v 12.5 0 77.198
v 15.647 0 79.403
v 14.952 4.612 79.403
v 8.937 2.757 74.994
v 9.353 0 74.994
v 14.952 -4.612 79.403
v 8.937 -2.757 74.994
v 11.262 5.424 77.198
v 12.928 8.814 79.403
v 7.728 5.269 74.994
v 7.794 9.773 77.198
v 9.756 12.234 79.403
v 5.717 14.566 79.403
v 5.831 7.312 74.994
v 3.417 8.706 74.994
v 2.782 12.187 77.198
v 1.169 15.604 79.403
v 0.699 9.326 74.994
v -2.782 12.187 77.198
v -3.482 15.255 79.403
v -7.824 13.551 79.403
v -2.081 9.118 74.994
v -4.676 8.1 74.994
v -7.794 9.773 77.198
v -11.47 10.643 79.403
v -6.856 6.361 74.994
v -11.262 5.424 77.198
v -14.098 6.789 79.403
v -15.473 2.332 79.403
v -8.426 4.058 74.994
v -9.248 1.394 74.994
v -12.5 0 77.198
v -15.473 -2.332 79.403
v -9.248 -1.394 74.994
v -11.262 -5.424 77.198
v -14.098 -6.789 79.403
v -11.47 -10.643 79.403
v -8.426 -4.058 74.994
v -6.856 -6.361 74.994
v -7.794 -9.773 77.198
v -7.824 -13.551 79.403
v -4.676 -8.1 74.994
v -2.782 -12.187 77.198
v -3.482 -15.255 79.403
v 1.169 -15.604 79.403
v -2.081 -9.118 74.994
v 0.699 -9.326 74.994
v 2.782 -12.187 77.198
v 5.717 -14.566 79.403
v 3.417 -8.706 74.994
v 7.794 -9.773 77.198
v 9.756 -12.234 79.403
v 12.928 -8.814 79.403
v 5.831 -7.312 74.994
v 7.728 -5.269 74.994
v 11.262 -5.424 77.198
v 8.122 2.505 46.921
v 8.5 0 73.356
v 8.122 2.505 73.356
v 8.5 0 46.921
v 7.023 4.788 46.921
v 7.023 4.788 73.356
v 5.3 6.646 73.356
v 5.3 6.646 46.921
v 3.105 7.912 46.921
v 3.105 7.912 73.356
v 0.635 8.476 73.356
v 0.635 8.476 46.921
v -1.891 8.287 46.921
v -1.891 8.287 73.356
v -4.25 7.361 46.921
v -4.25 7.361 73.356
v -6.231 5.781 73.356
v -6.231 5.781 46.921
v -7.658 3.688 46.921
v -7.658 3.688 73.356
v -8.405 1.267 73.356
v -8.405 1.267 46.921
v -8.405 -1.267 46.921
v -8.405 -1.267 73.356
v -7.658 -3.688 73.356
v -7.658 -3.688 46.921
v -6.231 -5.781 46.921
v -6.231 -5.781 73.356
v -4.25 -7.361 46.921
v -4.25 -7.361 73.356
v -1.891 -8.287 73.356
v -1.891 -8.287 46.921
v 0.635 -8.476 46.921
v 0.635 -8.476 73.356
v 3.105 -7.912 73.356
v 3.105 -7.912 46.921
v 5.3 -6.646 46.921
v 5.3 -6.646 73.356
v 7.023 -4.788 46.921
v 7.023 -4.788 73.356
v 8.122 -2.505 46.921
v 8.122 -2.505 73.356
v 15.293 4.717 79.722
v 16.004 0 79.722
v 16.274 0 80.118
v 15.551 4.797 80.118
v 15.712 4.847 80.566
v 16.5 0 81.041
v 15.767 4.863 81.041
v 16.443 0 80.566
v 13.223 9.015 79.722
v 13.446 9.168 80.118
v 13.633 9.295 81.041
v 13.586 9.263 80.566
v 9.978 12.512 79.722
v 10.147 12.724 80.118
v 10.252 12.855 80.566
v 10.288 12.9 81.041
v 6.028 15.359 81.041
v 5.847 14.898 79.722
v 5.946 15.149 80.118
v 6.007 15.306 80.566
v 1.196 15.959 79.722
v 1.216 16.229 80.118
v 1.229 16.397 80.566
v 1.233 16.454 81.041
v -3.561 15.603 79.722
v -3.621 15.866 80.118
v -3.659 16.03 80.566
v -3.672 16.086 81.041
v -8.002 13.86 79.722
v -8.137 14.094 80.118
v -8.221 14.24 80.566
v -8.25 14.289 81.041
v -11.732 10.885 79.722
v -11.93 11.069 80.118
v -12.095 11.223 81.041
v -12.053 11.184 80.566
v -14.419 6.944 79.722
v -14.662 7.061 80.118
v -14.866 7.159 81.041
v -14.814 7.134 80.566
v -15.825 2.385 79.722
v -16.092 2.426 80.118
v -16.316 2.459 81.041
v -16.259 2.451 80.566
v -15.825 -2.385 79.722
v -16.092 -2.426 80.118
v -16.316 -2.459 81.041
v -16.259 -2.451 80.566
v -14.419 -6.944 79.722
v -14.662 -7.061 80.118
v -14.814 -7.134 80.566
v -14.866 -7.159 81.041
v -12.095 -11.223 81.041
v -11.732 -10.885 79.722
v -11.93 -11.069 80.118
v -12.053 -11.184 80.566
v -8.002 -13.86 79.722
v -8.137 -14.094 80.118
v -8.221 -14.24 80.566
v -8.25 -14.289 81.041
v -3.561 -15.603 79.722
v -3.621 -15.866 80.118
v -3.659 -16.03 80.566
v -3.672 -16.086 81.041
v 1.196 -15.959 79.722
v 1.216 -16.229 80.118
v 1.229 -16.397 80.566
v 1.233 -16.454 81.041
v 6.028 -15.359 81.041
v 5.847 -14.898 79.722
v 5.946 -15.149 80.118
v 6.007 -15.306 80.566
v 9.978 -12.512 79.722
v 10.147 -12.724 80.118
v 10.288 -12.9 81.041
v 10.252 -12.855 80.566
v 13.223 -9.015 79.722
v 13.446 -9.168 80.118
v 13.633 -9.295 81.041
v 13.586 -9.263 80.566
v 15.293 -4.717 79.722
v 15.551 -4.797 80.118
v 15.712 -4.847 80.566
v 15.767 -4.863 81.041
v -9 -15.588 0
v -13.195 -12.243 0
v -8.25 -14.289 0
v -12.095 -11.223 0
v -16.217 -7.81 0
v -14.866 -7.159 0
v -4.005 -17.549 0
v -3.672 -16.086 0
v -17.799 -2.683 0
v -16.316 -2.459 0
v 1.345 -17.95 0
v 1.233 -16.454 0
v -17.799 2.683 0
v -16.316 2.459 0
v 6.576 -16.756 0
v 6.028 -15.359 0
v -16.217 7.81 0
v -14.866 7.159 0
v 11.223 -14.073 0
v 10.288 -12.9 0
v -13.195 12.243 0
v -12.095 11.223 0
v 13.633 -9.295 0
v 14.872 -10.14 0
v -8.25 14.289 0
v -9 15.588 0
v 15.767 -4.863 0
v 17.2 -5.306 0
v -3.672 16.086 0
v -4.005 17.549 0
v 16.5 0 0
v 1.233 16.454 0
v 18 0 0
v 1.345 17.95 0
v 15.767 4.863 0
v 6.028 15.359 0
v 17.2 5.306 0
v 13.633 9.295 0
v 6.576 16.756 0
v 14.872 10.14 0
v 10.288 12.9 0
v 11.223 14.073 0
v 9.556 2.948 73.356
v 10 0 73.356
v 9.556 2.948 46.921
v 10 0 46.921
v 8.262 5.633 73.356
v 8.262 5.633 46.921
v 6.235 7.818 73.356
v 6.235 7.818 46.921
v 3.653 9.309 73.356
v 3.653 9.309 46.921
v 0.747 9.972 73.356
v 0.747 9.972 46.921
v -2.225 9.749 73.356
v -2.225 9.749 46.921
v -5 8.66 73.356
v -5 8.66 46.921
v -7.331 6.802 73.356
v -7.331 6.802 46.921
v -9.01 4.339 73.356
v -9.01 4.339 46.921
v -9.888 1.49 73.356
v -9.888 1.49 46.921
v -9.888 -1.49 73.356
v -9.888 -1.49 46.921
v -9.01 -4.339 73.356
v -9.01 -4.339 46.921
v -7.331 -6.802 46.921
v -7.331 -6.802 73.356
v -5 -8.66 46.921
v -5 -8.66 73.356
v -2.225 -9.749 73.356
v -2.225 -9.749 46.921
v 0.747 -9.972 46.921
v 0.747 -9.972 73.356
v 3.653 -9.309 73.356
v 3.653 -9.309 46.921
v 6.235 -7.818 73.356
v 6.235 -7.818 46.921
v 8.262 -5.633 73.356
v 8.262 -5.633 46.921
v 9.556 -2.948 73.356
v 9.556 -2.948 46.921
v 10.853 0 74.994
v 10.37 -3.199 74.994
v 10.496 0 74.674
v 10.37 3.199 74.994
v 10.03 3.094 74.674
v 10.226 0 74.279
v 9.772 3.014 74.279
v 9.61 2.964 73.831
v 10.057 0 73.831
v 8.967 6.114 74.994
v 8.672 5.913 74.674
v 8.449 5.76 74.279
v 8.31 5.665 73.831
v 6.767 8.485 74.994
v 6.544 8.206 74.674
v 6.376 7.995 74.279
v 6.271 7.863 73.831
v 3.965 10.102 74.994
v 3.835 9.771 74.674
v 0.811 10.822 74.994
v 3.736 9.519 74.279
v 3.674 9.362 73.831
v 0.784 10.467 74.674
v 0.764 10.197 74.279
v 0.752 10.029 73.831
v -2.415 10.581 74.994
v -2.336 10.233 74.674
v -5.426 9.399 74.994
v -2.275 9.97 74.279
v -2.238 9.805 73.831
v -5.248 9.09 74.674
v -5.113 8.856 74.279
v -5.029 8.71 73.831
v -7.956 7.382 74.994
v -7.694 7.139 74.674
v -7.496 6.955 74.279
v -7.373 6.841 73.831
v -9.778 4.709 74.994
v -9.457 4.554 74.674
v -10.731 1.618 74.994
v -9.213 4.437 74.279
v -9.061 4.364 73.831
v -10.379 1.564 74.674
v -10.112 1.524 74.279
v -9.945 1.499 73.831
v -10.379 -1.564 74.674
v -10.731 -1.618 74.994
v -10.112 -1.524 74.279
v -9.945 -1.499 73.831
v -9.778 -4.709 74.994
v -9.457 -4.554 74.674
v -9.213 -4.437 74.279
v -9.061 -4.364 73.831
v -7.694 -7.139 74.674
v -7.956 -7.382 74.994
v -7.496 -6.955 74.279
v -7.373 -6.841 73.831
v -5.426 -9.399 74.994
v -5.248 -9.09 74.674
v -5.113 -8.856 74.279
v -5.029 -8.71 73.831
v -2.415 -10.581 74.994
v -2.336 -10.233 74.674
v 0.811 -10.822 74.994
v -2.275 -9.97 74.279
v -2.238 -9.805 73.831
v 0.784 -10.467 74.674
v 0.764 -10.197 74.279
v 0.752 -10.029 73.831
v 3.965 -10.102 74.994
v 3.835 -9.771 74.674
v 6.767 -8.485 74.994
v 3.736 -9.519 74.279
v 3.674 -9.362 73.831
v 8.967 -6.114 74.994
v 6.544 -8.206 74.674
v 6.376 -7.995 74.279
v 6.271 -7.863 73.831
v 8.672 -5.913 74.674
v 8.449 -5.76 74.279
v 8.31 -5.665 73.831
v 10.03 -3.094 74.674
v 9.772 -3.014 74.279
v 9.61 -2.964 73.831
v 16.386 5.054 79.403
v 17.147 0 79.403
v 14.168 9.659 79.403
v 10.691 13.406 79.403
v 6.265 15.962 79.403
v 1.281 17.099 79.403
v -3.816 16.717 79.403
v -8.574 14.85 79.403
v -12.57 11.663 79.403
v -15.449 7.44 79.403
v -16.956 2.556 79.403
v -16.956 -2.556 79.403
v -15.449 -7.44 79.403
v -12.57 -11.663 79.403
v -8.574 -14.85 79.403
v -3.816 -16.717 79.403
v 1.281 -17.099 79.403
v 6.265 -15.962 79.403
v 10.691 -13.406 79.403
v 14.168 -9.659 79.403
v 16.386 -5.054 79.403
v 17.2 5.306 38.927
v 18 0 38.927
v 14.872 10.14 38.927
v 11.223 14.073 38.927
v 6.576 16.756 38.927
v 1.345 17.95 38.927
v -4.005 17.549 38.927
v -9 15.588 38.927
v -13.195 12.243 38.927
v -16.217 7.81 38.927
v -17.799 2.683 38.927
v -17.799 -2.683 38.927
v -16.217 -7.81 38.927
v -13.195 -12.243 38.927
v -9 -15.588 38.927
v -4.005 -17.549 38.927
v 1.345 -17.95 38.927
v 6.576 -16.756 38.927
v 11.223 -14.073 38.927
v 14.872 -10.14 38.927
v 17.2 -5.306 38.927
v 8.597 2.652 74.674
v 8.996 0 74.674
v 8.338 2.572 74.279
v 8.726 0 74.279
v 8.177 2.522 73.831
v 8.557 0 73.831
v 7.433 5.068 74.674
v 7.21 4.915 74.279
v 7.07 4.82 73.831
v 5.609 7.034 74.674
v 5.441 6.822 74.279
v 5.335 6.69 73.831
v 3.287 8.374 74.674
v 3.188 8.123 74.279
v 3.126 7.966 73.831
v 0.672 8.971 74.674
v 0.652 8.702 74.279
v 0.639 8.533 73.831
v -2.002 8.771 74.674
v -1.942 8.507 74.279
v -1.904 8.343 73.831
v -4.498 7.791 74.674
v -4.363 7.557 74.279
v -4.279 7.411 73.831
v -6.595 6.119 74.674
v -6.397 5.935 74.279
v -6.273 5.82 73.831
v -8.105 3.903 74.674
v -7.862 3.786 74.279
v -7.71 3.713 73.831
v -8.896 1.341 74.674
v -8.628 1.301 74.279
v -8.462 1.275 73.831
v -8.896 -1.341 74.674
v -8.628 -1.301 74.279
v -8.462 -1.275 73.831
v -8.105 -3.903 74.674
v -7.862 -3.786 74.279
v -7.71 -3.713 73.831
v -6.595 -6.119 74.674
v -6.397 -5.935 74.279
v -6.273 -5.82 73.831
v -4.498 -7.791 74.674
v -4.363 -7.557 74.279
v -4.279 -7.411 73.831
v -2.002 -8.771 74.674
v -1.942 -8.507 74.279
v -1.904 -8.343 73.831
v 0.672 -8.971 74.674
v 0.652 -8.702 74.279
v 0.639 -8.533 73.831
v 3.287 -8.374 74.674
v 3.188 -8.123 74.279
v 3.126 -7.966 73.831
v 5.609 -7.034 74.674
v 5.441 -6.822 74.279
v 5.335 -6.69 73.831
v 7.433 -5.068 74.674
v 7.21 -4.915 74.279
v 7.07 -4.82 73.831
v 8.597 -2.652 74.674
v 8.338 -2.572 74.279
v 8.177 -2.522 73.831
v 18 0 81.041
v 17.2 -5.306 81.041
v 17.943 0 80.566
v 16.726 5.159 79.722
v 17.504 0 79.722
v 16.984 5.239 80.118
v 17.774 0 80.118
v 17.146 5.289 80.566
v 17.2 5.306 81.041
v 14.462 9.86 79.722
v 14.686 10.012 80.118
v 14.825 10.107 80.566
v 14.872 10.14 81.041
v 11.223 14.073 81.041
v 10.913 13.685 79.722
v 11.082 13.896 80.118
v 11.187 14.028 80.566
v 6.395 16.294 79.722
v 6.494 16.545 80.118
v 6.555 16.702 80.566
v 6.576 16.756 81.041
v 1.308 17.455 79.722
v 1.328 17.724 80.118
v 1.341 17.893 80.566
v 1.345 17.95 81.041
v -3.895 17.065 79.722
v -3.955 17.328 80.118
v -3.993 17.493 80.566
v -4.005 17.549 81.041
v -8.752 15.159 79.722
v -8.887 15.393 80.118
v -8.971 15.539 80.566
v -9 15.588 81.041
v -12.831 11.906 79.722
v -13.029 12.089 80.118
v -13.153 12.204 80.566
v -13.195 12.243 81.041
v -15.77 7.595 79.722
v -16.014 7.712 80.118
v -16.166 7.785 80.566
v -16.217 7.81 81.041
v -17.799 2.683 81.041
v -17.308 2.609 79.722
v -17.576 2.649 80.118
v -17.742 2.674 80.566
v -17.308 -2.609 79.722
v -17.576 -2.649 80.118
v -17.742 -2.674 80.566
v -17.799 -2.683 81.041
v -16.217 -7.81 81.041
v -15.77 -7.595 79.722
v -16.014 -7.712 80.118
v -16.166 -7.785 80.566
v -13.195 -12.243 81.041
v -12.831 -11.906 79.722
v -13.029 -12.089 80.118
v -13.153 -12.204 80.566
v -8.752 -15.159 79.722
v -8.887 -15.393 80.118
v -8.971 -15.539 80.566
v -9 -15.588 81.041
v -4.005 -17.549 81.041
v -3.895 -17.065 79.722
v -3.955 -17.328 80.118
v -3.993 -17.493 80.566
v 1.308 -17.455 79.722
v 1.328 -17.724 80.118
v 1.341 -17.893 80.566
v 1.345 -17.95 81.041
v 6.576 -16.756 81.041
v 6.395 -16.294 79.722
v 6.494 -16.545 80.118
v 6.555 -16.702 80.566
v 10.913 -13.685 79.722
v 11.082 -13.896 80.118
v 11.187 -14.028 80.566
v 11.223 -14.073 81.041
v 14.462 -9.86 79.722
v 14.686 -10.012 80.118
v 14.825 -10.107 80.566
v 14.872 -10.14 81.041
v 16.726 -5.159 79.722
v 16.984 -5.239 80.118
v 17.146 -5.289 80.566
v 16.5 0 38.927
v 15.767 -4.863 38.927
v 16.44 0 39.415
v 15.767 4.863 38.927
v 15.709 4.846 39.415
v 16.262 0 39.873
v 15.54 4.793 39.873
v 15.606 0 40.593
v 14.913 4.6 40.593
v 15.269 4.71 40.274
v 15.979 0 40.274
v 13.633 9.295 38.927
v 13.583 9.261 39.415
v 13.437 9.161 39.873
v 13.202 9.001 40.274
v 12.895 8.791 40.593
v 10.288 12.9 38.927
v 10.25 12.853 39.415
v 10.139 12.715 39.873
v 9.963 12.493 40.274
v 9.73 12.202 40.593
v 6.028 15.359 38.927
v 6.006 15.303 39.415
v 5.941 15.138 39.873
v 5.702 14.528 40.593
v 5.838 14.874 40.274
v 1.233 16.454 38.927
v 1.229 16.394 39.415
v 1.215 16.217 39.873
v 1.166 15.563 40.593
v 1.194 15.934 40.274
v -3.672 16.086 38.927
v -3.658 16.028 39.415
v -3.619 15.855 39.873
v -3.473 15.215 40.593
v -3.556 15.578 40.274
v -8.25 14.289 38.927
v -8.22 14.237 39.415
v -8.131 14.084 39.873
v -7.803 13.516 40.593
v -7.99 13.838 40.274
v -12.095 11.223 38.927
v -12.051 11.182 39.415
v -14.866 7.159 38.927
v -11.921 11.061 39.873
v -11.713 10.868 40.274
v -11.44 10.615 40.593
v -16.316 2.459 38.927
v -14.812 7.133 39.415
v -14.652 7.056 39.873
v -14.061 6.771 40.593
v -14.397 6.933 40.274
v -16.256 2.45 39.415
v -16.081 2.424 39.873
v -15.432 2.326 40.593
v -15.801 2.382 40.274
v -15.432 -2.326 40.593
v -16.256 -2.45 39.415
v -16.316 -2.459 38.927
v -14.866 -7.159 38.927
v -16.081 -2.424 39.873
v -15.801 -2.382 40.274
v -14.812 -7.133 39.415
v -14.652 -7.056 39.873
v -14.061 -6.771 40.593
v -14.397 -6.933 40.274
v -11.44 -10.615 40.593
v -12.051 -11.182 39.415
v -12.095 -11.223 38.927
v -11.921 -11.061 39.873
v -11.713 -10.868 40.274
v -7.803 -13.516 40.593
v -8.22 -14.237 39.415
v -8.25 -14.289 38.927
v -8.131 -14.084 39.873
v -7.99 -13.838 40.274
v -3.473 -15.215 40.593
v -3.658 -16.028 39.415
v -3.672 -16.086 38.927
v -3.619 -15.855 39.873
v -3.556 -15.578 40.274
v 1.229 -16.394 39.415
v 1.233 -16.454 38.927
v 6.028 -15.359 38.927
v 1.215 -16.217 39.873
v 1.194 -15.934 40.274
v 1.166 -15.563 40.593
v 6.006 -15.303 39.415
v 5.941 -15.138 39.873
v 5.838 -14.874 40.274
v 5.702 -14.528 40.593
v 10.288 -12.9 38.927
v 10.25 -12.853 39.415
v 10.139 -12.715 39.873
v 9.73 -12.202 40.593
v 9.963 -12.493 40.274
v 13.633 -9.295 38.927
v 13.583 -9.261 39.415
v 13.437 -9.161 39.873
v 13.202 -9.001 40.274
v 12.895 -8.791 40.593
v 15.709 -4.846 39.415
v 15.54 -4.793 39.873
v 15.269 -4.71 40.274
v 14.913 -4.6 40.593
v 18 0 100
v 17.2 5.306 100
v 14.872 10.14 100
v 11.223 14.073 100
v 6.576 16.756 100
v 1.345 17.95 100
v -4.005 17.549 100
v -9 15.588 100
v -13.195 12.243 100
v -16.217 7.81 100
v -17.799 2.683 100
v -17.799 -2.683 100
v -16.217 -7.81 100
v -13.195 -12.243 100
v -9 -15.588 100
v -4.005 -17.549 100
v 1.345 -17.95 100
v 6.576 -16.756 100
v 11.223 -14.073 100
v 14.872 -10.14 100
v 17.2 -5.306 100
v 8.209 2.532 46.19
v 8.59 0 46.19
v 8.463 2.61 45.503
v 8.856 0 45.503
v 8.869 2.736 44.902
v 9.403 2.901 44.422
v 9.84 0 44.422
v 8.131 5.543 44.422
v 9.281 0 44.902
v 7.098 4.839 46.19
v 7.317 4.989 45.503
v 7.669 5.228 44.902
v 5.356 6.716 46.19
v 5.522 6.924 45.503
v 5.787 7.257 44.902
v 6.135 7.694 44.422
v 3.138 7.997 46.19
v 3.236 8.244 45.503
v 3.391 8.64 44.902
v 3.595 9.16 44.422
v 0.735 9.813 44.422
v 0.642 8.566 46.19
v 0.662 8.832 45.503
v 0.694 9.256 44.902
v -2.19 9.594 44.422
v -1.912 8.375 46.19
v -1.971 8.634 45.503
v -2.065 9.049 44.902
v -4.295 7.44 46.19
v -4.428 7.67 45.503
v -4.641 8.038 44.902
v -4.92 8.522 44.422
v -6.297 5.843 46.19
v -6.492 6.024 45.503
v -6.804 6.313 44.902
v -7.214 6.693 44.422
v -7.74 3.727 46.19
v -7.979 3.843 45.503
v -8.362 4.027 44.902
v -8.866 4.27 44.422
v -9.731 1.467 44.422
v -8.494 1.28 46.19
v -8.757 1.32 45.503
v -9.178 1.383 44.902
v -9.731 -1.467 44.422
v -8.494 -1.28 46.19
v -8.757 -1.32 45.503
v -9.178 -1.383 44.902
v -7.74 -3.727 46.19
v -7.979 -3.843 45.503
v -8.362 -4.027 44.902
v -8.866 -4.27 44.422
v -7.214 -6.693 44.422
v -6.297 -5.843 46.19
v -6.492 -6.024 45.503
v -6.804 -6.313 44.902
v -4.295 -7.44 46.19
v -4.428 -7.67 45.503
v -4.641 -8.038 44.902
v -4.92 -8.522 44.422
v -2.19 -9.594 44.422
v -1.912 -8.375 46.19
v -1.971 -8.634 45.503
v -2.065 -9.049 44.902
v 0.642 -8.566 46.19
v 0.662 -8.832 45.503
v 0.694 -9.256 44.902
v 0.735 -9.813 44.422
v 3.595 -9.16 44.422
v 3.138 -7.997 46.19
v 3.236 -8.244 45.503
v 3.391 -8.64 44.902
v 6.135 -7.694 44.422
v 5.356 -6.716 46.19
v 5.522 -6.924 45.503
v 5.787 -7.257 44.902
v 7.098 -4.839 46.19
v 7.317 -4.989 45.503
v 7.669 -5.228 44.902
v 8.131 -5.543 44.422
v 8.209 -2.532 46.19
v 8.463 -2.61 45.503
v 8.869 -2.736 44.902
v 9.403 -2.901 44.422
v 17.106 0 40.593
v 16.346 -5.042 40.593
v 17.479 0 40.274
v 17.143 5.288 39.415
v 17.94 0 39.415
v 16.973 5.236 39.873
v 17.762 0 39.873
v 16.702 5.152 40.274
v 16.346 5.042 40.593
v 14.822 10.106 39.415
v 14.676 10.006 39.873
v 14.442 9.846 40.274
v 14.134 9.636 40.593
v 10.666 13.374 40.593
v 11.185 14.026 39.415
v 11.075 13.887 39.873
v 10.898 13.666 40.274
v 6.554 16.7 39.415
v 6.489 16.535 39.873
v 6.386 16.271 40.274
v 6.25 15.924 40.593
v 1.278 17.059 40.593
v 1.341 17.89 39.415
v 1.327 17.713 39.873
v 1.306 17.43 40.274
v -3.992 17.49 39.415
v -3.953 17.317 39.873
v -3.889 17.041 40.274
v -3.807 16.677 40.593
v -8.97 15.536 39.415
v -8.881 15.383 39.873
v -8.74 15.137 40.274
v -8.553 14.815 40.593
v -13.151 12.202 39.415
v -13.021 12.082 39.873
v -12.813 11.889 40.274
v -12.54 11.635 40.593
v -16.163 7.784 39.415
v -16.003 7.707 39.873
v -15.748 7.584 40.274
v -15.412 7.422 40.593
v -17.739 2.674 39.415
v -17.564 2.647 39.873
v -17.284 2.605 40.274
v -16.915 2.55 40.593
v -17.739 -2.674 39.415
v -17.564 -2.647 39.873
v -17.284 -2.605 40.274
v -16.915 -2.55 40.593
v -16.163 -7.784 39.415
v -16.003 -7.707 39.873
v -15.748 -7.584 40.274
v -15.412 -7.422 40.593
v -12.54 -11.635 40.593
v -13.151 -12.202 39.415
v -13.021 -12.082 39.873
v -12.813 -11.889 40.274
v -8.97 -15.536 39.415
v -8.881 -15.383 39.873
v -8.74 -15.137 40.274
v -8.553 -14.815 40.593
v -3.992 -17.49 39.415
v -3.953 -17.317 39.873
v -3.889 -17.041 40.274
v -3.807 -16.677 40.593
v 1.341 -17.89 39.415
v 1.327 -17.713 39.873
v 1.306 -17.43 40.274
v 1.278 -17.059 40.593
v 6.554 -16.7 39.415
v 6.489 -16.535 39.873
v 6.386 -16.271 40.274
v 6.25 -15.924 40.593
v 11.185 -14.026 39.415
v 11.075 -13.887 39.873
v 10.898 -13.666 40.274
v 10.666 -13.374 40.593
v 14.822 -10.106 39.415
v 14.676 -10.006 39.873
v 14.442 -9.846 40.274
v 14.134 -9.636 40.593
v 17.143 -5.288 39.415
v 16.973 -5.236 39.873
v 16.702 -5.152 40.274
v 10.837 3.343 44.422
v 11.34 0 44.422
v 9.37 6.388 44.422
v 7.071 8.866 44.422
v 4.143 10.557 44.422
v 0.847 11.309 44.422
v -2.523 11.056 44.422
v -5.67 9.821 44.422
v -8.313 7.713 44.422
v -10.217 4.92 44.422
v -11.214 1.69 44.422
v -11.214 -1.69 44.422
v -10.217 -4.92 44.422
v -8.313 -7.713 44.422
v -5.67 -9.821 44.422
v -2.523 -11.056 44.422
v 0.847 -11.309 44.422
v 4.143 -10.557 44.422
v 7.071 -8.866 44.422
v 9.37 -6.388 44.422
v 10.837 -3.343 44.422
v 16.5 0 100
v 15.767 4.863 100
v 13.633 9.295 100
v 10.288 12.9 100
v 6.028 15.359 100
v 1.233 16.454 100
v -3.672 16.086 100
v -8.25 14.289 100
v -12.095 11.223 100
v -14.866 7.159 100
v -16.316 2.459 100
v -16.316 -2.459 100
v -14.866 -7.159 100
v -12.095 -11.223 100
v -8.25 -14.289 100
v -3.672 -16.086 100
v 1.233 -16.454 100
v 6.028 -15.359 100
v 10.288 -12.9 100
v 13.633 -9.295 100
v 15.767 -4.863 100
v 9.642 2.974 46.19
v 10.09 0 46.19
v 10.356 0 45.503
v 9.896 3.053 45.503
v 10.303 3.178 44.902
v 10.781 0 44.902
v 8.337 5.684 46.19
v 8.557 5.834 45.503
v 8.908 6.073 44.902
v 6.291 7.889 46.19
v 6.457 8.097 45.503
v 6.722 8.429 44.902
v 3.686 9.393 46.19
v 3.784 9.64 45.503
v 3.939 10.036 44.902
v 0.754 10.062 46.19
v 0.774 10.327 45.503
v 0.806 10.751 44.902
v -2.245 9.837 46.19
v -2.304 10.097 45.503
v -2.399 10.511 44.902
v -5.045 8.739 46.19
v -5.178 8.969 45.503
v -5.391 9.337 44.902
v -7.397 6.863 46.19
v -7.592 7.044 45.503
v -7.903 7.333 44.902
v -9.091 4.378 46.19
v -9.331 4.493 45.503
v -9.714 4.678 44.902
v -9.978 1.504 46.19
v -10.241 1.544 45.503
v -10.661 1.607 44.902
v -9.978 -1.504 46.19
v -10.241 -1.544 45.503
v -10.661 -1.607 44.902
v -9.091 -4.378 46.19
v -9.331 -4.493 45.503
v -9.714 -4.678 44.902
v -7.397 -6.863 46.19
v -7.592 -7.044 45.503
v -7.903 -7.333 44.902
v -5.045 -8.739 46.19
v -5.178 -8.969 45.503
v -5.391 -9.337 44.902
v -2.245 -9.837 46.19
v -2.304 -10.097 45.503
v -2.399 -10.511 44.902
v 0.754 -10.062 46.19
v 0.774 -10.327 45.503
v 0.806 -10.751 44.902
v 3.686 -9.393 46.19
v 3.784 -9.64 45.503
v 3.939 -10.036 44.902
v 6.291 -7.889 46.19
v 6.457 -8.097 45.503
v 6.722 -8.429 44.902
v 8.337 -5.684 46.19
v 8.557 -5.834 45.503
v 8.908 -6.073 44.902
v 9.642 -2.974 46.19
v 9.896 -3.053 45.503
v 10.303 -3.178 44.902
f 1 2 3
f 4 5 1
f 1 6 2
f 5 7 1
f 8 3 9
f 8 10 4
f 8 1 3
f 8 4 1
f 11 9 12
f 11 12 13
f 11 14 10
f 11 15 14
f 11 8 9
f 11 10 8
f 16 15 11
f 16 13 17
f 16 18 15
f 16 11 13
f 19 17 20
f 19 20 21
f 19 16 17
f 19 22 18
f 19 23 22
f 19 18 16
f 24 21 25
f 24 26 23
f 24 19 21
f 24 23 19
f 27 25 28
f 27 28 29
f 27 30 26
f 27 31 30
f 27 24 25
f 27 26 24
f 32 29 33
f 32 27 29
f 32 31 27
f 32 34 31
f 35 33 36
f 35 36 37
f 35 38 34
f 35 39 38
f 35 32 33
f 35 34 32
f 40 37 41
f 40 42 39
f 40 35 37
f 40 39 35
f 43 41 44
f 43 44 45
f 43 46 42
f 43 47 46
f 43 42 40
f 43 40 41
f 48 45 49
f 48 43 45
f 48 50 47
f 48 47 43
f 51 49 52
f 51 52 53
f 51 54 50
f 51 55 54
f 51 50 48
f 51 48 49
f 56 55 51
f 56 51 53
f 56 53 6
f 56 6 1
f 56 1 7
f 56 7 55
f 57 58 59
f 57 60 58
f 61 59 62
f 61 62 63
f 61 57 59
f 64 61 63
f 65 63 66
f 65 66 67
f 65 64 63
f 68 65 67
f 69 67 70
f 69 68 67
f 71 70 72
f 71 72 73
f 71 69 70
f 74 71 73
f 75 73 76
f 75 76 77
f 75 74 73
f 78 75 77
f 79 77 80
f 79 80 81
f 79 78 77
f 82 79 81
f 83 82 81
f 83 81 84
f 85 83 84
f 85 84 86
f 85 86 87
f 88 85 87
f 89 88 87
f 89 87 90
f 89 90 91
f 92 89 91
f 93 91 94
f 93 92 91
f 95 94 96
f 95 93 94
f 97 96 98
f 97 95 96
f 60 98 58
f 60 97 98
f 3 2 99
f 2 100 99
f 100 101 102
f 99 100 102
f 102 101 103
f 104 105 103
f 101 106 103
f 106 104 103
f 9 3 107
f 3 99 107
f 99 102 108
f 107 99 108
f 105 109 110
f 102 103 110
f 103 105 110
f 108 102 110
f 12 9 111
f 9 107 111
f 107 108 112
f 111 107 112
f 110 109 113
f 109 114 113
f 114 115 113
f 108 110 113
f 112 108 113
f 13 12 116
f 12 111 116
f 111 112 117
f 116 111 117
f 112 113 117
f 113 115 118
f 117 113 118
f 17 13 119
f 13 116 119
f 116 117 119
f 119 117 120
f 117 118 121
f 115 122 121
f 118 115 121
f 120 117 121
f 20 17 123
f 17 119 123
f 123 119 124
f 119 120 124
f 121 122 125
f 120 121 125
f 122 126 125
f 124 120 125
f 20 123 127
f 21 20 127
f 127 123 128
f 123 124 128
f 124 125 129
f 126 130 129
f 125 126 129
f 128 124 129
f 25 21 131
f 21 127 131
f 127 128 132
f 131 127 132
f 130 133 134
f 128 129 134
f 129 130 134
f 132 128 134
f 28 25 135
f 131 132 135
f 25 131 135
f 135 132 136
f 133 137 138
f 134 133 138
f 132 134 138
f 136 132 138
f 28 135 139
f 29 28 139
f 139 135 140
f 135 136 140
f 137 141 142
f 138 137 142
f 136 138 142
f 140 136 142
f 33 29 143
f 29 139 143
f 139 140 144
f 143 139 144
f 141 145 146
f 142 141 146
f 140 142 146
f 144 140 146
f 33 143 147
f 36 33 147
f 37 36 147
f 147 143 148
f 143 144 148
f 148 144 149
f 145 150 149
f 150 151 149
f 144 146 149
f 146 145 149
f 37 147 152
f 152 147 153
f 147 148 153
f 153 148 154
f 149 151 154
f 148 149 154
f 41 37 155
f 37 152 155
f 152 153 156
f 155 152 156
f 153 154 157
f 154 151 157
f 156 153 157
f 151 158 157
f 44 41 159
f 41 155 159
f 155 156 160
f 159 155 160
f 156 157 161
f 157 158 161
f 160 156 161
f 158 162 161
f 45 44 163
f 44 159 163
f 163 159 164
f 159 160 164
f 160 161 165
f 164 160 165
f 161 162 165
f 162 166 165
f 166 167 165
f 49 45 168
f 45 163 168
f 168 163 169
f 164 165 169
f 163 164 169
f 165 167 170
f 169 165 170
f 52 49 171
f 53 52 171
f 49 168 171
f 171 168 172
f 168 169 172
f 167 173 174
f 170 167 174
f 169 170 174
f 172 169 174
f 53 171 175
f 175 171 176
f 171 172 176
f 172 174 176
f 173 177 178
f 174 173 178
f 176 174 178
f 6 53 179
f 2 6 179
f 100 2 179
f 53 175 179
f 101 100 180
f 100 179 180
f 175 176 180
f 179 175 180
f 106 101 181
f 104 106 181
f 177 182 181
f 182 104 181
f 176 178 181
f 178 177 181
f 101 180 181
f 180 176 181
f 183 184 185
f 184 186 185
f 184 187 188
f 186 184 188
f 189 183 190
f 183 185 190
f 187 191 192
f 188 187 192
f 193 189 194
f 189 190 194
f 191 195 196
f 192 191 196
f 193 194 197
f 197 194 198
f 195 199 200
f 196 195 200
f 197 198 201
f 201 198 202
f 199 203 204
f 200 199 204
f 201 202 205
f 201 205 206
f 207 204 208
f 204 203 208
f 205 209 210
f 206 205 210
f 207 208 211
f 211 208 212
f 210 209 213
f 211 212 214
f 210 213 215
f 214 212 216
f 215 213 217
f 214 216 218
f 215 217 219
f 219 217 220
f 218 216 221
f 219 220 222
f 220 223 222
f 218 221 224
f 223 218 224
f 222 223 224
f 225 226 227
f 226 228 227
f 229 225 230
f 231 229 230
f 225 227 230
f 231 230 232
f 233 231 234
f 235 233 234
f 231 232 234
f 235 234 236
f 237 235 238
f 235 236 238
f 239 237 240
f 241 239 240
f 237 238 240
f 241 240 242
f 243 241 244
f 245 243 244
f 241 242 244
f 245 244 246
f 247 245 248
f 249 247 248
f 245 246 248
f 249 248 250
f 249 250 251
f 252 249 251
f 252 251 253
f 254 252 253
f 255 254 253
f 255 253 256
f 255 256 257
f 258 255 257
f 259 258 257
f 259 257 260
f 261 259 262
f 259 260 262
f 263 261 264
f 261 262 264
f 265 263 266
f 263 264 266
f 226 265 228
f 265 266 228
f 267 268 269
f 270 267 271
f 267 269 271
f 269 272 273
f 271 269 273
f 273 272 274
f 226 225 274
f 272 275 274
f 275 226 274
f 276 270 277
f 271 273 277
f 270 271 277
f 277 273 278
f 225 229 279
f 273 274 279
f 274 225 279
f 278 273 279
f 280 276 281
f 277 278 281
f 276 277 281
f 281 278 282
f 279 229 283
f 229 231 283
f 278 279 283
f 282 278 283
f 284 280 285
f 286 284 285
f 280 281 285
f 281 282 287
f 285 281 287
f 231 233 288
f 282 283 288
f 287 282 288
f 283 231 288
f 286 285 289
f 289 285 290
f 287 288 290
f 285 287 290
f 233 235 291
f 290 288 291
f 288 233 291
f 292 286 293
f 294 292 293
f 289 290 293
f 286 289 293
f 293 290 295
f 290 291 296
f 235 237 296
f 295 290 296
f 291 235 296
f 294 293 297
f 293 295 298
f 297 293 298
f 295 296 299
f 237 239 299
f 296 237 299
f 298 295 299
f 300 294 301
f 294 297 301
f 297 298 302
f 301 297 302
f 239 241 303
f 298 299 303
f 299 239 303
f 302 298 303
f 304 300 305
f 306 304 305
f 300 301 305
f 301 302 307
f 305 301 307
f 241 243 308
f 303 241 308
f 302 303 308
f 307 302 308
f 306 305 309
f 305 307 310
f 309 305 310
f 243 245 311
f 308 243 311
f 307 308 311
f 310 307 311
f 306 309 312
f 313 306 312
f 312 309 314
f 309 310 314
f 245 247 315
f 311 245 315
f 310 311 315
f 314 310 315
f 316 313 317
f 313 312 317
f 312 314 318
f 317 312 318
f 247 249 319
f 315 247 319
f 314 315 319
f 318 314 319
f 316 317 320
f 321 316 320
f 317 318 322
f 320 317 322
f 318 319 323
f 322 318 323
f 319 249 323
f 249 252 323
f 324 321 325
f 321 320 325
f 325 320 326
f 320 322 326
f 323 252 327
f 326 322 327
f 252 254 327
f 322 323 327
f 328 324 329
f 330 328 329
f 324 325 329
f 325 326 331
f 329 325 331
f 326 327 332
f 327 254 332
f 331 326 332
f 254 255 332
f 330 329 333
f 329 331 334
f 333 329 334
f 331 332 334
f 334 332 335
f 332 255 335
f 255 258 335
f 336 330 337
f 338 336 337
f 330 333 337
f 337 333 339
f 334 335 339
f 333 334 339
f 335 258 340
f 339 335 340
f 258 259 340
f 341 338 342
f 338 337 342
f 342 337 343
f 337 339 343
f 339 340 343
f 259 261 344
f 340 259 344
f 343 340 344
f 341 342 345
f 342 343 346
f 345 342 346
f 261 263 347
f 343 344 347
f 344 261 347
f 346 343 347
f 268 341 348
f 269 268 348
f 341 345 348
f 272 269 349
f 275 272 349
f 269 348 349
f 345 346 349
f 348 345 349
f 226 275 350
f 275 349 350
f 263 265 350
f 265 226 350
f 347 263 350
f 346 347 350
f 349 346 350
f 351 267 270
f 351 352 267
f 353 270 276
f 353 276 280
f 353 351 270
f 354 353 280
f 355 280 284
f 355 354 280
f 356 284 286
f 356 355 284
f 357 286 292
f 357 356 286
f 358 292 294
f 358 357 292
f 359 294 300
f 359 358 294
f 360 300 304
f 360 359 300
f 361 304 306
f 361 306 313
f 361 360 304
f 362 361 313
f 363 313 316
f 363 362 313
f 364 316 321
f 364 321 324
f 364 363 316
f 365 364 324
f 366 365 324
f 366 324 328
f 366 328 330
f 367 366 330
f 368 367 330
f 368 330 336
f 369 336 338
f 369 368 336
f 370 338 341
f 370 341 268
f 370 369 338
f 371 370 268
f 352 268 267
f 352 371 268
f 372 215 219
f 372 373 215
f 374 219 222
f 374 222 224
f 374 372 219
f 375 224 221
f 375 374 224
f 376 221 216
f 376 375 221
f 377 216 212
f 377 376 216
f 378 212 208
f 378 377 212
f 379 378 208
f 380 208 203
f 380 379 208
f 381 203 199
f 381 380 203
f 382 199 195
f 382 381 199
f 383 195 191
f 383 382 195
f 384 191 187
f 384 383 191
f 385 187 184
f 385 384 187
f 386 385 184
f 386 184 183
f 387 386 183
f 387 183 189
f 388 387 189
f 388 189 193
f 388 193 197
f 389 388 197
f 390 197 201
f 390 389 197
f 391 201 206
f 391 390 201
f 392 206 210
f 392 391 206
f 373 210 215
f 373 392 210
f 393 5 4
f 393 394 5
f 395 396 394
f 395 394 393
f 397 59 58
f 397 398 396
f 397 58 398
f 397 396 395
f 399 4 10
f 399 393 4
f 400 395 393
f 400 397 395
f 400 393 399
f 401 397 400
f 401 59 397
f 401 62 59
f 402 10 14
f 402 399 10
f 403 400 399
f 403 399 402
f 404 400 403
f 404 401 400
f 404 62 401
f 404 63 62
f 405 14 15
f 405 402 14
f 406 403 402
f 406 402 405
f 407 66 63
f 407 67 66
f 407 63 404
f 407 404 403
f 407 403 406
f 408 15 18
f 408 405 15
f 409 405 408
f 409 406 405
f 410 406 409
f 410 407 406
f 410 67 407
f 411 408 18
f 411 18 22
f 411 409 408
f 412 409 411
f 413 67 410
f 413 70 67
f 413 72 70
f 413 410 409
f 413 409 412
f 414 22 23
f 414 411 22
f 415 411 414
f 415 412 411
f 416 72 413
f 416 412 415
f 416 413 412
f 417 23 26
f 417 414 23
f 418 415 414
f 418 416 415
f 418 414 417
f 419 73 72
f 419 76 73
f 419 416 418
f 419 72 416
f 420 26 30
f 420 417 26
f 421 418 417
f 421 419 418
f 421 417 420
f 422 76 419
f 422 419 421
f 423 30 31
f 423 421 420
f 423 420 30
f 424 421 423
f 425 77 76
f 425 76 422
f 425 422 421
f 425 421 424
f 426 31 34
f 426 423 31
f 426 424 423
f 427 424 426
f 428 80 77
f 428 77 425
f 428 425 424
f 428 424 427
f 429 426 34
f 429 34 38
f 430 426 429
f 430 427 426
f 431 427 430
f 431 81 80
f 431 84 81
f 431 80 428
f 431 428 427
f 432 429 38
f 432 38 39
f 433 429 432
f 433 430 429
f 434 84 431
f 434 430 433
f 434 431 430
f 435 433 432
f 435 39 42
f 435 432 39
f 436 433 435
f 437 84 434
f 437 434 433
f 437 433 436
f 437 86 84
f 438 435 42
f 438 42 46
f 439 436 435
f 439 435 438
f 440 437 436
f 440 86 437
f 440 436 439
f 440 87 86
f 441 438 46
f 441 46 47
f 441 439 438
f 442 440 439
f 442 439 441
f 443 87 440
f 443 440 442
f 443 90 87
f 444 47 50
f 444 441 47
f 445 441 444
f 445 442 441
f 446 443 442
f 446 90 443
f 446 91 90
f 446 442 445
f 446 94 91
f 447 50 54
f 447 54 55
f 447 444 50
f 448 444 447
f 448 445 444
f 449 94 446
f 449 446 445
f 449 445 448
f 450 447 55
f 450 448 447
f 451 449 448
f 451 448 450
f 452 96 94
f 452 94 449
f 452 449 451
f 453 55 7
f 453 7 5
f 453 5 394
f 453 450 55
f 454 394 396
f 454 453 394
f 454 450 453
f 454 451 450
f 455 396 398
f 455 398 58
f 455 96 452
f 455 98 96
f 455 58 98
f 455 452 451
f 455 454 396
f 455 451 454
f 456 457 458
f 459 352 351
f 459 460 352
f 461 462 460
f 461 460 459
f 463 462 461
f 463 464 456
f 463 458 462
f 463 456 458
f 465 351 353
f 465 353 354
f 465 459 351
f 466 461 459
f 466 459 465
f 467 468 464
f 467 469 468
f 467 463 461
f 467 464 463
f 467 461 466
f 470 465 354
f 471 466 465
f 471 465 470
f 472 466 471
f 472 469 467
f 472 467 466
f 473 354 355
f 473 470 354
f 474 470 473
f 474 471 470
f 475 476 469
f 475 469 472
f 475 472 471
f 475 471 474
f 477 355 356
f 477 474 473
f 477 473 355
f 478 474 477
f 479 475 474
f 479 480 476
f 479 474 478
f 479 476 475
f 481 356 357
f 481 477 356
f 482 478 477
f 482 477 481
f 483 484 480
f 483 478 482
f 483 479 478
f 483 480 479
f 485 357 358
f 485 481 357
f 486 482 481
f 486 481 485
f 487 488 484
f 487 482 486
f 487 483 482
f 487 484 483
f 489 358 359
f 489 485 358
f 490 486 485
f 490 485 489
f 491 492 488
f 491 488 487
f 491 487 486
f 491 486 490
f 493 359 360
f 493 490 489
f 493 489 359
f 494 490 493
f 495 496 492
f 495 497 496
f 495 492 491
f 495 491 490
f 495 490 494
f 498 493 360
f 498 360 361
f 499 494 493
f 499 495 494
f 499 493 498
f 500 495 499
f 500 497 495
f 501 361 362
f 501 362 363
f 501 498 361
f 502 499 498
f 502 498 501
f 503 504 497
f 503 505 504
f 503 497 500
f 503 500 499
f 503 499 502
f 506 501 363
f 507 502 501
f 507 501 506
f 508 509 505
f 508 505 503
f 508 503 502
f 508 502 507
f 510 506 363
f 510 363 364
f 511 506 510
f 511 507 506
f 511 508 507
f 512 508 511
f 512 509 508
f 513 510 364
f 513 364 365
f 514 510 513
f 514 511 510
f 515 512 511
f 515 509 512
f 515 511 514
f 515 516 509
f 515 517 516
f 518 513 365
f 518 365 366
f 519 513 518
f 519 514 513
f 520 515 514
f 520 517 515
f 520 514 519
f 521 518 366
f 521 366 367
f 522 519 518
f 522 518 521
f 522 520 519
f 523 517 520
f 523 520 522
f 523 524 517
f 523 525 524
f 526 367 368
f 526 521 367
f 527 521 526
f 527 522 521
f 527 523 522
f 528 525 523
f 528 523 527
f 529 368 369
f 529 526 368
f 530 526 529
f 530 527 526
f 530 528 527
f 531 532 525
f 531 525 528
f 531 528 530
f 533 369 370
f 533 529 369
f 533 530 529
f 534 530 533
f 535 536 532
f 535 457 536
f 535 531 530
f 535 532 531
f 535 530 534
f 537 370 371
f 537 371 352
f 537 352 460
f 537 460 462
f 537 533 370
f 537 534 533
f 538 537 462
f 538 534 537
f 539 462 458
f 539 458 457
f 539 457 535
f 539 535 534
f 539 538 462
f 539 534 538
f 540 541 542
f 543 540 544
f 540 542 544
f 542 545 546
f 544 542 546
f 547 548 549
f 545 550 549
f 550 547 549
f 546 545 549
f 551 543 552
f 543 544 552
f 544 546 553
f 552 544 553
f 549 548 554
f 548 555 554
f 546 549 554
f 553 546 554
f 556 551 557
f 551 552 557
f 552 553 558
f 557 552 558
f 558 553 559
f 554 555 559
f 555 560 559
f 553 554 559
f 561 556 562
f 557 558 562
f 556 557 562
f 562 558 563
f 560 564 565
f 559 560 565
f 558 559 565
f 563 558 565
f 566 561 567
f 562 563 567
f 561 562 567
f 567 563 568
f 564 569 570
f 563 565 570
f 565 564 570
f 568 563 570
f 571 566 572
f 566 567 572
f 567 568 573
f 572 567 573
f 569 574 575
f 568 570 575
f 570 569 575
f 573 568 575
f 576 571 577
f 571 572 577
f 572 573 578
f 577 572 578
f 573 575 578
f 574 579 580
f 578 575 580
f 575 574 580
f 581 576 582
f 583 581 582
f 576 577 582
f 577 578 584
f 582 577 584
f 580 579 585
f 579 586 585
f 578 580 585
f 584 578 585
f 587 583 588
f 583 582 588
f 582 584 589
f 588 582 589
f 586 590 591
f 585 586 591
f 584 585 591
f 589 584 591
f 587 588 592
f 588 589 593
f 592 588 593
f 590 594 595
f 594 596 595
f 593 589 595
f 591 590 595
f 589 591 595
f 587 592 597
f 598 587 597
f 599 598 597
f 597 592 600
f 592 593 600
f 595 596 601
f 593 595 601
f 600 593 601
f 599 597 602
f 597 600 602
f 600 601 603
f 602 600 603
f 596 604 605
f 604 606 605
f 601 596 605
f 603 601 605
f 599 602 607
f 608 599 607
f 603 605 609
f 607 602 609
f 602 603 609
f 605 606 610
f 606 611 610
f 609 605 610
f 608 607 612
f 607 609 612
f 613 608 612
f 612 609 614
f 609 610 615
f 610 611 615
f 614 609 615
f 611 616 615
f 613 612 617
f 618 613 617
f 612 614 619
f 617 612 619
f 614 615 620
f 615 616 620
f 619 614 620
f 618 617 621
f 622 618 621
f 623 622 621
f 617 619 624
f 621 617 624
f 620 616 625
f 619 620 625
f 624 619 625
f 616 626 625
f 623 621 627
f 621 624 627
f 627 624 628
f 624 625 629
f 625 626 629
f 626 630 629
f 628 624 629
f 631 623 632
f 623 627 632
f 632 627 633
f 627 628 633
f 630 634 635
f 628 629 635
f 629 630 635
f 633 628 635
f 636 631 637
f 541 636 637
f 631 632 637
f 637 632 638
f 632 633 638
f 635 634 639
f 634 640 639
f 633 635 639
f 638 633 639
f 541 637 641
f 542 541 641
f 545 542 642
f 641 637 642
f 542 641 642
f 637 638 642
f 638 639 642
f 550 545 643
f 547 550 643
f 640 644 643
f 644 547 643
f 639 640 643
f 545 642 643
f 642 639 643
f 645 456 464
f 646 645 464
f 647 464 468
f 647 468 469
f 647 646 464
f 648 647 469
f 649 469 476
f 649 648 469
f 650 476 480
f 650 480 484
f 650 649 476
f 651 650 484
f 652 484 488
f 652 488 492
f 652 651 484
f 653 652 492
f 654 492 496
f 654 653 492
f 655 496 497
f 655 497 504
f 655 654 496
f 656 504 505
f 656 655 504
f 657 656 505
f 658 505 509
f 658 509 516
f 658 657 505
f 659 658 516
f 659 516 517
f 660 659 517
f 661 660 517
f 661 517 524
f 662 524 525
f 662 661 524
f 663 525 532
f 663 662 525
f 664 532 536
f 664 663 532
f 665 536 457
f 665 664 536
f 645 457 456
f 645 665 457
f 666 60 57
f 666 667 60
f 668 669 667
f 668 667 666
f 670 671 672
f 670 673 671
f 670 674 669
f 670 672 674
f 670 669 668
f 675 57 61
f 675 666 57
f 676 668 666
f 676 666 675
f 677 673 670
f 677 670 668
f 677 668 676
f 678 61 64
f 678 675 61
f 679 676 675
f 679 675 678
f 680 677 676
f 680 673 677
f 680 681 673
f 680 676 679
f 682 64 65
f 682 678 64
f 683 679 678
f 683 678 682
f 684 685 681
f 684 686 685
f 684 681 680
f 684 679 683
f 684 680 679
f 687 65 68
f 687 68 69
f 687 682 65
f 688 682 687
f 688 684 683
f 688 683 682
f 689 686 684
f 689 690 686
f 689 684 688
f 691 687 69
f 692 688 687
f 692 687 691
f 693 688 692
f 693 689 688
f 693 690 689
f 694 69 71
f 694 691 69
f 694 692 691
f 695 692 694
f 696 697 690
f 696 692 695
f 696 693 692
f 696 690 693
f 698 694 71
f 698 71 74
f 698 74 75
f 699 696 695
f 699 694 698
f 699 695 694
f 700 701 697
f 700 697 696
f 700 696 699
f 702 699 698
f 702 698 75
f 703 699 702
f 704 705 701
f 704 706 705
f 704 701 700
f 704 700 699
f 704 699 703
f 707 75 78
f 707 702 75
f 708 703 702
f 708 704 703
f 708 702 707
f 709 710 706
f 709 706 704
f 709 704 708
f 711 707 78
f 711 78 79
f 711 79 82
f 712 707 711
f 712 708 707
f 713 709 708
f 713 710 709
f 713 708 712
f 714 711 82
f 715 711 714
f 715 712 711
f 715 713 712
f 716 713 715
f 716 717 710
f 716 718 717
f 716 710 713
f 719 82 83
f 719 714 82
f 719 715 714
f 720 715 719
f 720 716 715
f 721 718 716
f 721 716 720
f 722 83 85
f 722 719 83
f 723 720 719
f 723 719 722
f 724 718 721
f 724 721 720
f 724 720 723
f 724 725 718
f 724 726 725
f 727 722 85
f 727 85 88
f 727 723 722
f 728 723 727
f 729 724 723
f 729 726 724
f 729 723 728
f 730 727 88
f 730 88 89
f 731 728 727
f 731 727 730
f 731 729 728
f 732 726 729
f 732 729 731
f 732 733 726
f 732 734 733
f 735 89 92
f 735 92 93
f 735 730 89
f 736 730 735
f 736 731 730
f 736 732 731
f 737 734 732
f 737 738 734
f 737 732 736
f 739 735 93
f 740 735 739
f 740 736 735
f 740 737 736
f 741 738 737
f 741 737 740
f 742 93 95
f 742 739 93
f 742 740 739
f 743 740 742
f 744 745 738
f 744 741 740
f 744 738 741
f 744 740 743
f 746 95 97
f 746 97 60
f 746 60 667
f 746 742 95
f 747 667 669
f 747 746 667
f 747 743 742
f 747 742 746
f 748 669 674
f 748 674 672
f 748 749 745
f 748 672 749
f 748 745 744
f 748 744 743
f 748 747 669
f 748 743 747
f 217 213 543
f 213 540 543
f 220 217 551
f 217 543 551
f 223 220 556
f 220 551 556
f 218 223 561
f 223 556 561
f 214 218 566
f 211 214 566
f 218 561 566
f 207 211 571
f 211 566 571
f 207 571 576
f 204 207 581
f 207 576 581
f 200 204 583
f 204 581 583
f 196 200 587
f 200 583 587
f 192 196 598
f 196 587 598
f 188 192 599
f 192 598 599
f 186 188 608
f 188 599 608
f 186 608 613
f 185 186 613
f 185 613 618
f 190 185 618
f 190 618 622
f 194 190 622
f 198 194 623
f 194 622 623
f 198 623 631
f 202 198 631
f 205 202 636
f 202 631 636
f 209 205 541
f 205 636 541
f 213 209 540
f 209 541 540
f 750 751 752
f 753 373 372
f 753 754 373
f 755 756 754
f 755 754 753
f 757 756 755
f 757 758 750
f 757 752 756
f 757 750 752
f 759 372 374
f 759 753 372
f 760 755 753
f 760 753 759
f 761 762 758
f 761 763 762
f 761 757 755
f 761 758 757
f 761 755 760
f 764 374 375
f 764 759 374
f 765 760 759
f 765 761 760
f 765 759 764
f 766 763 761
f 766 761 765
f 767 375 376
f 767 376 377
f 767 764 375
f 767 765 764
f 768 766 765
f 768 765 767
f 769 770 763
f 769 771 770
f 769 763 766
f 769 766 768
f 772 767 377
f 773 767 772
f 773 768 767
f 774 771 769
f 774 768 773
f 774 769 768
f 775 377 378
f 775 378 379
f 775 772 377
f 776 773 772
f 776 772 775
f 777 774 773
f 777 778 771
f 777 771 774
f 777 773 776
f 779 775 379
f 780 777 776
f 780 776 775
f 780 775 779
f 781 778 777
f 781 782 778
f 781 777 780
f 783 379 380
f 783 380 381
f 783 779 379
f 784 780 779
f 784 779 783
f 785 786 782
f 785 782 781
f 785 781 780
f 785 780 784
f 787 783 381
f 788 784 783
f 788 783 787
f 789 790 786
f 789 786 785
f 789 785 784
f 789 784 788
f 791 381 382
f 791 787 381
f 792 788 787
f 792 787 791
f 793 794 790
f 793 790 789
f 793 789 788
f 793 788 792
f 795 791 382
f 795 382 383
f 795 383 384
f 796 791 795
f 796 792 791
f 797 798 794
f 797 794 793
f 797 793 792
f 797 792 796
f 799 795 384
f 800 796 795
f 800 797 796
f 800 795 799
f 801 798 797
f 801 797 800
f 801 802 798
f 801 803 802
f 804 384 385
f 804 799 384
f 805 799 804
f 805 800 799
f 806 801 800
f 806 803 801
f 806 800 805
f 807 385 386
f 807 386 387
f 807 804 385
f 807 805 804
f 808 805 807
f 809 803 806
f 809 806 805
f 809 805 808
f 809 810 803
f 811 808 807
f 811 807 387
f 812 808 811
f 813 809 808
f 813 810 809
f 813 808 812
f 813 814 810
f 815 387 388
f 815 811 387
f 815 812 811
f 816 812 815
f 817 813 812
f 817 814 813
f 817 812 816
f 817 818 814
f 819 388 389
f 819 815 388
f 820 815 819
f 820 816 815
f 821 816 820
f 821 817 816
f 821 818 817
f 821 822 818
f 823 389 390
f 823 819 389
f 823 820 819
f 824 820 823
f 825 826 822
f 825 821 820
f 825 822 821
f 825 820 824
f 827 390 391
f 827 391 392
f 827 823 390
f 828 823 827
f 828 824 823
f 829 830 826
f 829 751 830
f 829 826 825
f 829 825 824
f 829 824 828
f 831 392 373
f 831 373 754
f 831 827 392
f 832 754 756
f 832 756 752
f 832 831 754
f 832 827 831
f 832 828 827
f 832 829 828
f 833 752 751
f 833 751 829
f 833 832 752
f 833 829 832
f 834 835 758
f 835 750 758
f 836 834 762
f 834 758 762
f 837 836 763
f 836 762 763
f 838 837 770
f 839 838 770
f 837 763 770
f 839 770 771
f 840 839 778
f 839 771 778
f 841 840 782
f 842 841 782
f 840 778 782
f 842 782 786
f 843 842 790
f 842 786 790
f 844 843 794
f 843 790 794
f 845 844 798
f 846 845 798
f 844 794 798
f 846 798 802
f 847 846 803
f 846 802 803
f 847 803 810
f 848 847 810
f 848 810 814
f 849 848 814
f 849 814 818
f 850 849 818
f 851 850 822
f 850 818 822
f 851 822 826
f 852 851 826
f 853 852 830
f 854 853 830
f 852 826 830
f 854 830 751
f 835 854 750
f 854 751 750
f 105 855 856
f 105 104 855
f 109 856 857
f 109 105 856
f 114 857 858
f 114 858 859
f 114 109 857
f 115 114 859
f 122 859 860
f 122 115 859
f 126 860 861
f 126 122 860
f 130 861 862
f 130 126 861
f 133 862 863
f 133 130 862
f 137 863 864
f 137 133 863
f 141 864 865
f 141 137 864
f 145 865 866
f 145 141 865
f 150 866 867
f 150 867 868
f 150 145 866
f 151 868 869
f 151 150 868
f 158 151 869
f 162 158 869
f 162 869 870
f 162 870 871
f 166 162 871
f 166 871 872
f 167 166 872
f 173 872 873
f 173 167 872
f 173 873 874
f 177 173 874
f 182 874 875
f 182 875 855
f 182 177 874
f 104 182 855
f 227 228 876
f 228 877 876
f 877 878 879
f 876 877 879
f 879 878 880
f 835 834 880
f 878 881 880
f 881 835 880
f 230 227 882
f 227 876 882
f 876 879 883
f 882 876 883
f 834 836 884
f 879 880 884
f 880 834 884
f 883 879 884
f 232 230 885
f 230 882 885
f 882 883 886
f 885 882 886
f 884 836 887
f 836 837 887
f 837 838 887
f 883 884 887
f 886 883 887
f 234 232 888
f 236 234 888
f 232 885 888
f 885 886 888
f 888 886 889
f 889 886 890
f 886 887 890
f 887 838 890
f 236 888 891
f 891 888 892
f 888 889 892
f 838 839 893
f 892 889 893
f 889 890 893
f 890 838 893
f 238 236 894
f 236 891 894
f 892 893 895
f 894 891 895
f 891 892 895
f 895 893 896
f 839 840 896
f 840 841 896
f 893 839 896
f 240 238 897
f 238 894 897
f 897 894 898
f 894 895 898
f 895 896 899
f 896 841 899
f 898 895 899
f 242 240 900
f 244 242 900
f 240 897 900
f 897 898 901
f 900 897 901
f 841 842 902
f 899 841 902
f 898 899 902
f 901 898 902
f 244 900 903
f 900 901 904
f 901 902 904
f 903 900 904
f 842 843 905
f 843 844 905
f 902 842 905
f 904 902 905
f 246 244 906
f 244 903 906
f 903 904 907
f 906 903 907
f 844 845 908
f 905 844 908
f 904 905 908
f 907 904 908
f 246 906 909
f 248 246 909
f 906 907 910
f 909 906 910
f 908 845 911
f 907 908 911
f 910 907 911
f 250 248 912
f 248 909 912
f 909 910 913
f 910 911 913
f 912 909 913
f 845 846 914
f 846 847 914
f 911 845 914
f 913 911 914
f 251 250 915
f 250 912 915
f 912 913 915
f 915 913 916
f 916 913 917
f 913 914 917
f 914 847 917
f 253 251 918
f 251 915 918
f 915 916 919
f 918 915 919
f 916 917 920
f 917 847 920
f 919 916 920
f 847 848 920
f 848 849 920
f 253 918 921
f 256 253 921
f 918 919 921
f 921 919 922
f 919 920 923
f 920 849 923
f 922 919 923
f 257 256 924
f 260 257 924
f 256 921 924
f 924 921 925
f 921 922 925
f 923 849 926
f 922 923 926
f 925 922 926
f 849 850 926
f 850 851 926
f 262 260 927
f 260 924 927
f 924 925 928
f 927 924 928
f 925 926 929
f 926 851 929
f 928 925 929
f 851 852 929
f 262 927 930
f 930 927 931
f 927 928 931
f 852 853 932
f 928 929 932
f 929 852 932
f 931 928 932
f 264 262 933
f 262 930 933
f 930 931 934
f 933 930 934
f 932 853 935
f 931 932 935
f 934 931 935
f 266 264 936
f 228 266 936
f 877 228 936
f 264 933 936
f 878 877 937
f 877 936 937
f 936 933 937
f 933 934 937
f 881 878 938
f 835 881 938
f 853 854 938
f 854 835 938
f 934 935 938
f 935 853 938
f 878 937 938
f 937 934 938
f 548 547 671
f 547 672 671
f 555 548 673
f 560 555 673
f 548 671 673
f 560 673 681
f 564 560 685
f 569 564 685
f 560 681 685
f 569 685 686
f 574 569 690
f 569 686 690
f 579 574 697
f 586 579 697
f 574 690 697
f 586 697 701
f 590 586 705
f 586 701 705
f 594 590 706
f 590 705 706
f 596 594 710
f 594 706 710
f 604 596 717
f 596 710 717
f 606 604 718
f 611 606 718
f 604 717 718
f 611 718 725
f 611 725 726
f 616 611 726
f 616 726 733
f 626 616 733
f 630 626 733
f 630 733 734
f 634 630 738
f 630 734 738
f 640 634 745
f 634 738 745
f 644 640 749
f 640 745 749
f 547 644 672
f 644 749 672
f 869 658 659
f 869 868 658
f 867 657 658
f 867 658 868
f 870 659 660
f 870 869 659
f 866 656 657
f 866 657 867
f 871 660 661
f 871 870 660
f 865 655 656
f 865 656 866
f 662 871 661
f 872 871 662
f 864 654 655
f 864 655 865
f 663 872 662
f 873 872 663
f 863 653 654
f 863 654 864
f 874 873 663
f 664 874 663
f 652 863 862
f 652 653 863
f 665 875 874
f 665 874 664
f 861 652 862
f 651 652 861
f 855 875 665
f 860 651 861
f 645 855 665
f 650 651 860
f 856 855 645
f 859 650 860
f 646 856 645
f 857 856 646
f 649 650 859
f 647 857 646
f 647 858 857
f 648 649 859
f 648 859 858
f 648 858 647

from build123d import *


with BuildPart() as part:
    # Sketch → Revolve (revolve)
    with BuildSketch(Plane.XZ):
        with BuildLine():
            Line((18, 0), (18, 38.927282))
            ThreePointArc((18, 38.927282), (17.762487, 39.872608), (17.10636, 40.593406))
            Line((11.34046, 44.42215), (17.10636, 40.593406))
            ThreePointArc((10, 46.921335), (10.35627, 45.503347), (11.34046, 44.42215))
            Line((10, 73.35583), (10, 46.921335))
            ThreePointArc((10.852636, 74.993986), (10.225919, 74.279213), (10, 73.35583))
            Line((10.852636, 74.993986), (17.147364, 79.402814))
            ThreePointArc((17.147364, 79.402814), (17.774081, 80.117587), (18, 81.04097))
            Line((18, 81.04097), (18, 100))
            Line((18, 100), (16.5, 100))
            Line((16.5, 100), (16.5, 81.04097))
            ThreePointArc((15.647364, 79.402814), (16.274081, 80.117587), (16.5, 81.04097))
            Line((15.647364, 79.402814), (9.352636, 74.993986))
            ThreePointArc((9.352636, 74.993986), (8.725919, 74.279213), (8.5, 73.35583))
            Line((8.5, 73.35583), (8.5, 46.921335))
            ThreePointArc((8.5, 46.921335), (8.85627, 45.503347), (9.84046, 44.42215))
            Line((15.60636, 40.593406), (9.84046, 44.42215))
            ThreePointArc((16.5, 38.927282), (16.262487, 39.872608), (15.60636, 40.593406))
            Line((16.5, 0), (16.5, 38.927282))
            Line((18, 0), (16.5, 0))
        make_face()
    revolve(axis=Axis((0, 0, 0), (0, 0, 1)))


solid = part.part
